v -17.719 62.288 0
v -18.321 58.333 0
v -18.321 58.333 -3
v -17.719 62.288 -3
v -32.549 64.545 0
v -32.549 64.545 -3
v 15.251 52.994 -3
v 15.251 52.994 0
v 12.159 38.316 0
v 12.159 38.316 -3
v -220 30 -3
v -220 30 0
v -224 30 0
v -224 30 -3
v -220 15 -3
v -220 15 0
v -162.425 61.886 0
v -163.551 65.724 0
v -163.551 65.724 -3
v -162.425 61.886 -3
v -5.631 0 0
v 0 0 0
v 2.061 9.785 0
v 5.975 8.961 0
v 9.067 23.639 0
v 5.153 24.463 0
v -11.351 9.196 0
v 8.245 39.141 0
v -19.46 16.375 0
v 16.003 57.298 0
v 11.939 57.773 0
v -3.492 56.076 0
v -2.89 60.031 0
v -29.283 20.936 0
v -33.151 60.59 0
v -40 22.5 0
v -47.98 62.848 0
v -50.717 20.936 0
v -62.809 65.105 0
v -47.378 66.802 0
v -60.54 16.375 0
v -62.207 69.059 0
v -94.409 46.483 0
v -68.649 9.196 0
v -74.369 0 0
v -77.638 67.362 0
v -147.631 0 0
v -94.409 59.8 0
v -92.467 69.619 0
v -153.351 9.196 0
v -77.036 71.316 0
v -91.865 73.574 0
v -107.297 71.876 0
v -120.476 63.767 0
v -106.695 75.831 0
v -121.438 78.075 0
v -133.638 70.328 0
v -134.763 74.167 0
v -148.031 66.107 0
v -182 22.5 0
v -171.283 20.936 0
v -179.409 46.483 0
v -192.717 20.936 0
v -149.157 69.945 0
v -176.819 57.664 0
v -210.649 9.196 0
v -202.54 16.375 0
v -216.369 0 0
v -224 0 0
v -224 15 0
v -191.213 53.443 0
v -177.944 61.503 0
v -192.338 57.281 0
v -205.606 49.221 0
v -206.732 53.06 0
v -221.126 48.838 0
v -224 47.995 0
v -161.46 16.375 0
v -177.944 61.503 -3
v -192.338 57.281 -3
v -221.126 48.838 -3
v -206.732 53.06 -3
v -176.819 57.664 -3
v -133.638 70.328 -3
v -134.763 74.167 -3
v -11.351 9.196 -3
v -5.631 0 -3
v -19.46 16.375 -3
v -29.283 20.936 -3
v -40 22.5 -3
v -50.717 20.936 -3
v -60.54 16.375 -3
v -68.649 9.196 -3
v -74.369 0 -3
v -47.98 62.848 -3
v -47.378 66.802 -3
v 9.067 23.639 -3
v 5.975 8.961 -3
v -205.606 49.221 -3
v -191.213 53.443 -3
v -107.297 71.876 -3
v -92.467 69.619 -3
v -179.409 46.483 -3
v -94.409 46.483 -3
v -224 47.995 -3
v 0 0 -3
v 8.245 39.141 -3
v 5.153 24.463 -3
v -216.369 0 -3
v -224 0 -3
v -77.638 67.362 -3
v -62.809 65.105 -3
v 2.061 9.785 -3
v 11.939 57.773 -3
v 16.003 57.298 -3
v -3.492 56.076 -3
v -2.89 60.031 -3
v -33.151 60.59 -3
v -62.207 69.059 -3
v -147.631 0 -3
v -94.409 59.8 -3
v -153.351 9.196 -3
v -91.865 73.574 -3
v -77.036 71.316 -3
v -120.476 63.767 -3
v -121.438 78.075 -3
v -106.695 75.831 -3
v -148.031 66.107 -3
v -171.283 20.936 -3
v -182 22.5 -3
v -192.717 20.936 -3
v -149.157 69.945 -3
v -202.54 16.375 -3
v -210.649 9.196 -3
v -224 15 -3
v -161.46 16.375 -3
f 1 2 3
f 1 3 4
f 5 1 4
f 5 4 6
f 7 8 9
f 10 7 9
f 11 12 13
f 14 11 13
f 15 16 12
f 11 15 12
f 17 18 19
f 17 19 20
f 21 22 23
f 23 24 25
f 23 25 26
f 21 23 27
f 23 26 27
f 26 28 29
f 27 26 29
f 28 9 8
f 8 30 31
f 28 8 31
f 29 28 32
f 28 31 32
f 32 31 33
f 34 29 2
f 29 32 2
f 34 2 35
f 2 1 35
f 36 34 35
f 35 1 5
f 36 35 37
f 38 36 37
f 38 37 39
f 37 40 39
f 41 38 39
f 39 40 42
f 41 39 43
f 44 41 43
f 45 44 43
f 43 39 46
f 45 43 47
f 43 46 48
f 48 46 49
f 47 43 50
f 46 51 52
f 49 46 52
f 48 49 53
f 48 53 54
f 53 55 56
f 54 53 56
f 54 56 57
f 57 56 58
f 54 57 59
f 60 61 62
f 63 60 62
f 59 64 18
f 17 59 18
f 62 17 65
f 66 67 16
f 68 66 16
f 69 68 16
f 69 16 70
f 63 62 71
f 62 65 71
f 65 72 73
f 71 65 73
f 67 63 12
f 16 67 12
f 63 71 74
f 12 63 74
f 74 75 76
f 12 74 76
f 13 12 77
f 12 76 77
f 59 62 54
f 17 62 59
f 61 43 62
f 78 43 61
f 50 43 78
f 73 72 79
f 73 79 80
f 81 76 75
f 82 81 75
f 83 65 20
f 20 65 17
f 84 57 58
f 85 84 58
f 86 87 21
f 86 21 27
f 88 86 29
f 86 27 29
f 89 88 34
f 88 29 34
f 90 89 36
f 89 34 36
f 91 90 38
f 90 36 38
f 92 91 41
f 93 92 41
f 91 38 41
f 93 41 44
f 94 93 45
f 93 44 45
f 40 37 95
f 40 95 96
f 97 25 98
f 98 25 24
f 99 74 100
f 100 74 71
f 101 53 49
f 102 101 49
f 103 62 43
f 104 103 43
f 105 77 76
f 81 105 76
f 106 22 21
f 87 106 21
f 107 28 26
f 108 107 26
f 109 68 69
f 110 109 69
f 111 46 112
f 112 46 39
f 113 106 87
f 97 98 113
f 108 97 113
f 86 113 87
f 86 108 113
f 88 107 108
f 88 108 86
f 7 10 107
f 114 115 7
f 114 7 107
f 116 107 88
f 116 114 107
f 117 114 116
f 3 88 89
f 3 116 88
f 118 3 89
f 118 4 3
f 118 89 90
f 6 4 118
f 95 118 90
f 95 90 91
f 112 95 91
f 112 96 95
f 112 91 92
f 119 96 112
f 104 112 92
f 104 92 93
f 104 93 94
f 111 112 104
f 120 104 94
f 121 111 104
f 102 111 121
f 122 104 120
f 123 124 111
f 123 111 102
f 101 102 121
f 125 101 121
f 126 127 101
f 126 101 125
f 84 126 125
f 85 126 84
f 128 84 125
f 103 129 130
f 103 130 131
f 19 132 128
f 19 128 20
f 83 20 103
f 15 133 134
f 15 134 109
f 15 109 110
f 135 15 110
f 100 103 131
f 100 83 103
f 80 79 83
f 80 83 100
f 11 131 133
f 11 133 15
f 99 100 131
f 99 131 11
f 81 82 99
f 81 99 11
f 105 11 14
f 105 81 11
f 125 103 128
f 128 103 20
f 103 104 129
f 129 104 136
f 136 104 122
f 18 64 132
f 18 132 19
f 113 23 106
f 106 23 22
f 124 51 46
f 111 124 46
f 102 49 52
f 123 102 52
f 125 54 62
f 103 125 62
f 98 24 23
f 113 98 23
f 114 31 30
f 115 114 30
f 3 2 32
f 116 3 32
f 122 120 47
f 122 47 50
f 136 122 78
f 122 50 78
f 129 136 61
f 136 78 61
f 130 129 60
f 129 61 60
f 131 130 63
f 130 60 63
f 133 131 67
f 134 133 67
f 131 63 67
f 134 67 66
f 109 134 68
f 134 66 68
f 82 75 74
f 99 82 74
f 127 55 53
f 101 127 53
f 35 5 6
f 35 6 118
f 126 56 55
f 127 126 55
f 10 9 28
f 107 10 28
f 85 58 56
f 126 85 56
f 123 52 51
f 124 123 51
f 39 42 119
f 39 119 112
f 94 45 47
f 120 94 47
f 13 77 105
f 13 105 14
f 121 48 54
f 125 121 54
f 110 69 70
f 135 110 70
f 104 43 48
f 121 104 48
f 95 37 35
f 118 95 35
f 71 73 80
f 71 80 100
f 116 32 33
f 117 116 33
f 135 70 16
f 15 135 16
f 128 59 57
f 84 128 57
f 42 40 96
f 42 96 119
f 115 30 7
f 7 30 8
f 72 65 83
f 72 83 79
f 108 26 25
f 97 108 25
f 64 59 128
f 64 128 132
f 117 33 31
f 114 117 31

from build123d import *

# Parameters (mm, degrees)
BOSS_EXTRUDE1_DEPTH = 3
SKETCH2_R           = 37.5
CUT_EXTRUDE1_DEPTH  = 3
SKETCH3_W           = 4
SKETCH3_H           = 15
BOSS_EXTRUDE4_DEPTH = 3


with BuildPart() as part:
    # Sketch1 → Boss-Extrude1 (new body)
    with BuildSketch(Plane.XY):
        Polygon((11.337032692, 53.818878563), (0, 0), (-220, 0), (-220, 45), (-121.162967308, 73.986910298), align=None)
        Polygon((-94.409209541, 46.483265917), (-94.409209541, 59.799500594), (-120.476048116, 63.767174765), (-179.409209541, 46.483265917), align=None, mode=Mode.SUBTRACT)
    extrude(amount=-BOSS_EXTRUDE1_DEPTH)

    # Sketch2 → Cut-Extrude1 (cut)
    with BuildSketch(Plane.XY):
        with Locations((-182, -15)):
            Circle(SKETCH2_R)
        with Locations((-40, -15)):
            Circle(SKETCH2_R)
    extrude(amount=-CUT_EXTRUDE1_DEPTH, mode=Mode.SUBTRACT)

    # Sketch3 → Boss-Extrude4 (add)
    with BuildSketch(Plane.XY):
        Polygon((-206.731962629, 53.05972607), (-205.606257375, 49.221394704), (-220, 45), (-220, 30), (-224, 30), (-224, 45), (-224, 47.99535863), (-221.125705254, 48.838331367), align=None)
        Polygon((-192.338220004, 57.281120774), (-191.21251475, 53.442789407), (-176.818772125, 57.664184111), (-177.944477379, 61.502515478), align=None)
        Polygon((-121.437734985, 78.074804512), (-106.694649955, 75.830736536), (-107.296563448, 71.876283331), (-121.162967308, 73.986910298), (-133.63754425, 70.328368222), (-134.763249504, 74.166699588), align=None)
        Polygon((-77.03625092, 71.316385344), (-77.638164413, 67.361932139), (-92.46736393, 69.619107735), (-91.865450438, 73.57356094), align=None)
        Polygon((-3.492166825, 56.076054159), (-2.890253333, 60.030507363), (11.938946184, 57.773331767), (16.003099334, 57.297974706), (15.251132951, 52.994367094), (12.159214944, 38.316491123), (8.245114685, 39.141002591), (11.337032692, 53.818878563), align=None)
        Polygon((-18.321366343, 58.333229755), (-17.719452851, 62.287682959), (-32.548652368, 64.544858556), (-33.15056586, 60.590405351), align=None)
        Polygon((-163.550734754, 65.723910181), (-162.4250295, 61.885578815), (-148.031286875, 66.106973518), (-149.156992129, 69.945304885), align=None)
        Polygon((-47.979765378, 62.847580947), (-47.377851886, 66.802034152), (-62.207051403, 69.059209748), (-62.808964895, 65.104756543), align=None)
        with Locations((-222, 7.5)):
            Rectangle(SKETCH3_W, SKETCH3_H)
        Polygon((5.153196678, 24.463126619), (9.067296937, 23.638615151), (5.97537893, 8.960739179), (2.061278671, 9.785250648), align=None)
    extrude(amount=-BOSS_EXTRUDE4_DEPTH)


solid = part.part
